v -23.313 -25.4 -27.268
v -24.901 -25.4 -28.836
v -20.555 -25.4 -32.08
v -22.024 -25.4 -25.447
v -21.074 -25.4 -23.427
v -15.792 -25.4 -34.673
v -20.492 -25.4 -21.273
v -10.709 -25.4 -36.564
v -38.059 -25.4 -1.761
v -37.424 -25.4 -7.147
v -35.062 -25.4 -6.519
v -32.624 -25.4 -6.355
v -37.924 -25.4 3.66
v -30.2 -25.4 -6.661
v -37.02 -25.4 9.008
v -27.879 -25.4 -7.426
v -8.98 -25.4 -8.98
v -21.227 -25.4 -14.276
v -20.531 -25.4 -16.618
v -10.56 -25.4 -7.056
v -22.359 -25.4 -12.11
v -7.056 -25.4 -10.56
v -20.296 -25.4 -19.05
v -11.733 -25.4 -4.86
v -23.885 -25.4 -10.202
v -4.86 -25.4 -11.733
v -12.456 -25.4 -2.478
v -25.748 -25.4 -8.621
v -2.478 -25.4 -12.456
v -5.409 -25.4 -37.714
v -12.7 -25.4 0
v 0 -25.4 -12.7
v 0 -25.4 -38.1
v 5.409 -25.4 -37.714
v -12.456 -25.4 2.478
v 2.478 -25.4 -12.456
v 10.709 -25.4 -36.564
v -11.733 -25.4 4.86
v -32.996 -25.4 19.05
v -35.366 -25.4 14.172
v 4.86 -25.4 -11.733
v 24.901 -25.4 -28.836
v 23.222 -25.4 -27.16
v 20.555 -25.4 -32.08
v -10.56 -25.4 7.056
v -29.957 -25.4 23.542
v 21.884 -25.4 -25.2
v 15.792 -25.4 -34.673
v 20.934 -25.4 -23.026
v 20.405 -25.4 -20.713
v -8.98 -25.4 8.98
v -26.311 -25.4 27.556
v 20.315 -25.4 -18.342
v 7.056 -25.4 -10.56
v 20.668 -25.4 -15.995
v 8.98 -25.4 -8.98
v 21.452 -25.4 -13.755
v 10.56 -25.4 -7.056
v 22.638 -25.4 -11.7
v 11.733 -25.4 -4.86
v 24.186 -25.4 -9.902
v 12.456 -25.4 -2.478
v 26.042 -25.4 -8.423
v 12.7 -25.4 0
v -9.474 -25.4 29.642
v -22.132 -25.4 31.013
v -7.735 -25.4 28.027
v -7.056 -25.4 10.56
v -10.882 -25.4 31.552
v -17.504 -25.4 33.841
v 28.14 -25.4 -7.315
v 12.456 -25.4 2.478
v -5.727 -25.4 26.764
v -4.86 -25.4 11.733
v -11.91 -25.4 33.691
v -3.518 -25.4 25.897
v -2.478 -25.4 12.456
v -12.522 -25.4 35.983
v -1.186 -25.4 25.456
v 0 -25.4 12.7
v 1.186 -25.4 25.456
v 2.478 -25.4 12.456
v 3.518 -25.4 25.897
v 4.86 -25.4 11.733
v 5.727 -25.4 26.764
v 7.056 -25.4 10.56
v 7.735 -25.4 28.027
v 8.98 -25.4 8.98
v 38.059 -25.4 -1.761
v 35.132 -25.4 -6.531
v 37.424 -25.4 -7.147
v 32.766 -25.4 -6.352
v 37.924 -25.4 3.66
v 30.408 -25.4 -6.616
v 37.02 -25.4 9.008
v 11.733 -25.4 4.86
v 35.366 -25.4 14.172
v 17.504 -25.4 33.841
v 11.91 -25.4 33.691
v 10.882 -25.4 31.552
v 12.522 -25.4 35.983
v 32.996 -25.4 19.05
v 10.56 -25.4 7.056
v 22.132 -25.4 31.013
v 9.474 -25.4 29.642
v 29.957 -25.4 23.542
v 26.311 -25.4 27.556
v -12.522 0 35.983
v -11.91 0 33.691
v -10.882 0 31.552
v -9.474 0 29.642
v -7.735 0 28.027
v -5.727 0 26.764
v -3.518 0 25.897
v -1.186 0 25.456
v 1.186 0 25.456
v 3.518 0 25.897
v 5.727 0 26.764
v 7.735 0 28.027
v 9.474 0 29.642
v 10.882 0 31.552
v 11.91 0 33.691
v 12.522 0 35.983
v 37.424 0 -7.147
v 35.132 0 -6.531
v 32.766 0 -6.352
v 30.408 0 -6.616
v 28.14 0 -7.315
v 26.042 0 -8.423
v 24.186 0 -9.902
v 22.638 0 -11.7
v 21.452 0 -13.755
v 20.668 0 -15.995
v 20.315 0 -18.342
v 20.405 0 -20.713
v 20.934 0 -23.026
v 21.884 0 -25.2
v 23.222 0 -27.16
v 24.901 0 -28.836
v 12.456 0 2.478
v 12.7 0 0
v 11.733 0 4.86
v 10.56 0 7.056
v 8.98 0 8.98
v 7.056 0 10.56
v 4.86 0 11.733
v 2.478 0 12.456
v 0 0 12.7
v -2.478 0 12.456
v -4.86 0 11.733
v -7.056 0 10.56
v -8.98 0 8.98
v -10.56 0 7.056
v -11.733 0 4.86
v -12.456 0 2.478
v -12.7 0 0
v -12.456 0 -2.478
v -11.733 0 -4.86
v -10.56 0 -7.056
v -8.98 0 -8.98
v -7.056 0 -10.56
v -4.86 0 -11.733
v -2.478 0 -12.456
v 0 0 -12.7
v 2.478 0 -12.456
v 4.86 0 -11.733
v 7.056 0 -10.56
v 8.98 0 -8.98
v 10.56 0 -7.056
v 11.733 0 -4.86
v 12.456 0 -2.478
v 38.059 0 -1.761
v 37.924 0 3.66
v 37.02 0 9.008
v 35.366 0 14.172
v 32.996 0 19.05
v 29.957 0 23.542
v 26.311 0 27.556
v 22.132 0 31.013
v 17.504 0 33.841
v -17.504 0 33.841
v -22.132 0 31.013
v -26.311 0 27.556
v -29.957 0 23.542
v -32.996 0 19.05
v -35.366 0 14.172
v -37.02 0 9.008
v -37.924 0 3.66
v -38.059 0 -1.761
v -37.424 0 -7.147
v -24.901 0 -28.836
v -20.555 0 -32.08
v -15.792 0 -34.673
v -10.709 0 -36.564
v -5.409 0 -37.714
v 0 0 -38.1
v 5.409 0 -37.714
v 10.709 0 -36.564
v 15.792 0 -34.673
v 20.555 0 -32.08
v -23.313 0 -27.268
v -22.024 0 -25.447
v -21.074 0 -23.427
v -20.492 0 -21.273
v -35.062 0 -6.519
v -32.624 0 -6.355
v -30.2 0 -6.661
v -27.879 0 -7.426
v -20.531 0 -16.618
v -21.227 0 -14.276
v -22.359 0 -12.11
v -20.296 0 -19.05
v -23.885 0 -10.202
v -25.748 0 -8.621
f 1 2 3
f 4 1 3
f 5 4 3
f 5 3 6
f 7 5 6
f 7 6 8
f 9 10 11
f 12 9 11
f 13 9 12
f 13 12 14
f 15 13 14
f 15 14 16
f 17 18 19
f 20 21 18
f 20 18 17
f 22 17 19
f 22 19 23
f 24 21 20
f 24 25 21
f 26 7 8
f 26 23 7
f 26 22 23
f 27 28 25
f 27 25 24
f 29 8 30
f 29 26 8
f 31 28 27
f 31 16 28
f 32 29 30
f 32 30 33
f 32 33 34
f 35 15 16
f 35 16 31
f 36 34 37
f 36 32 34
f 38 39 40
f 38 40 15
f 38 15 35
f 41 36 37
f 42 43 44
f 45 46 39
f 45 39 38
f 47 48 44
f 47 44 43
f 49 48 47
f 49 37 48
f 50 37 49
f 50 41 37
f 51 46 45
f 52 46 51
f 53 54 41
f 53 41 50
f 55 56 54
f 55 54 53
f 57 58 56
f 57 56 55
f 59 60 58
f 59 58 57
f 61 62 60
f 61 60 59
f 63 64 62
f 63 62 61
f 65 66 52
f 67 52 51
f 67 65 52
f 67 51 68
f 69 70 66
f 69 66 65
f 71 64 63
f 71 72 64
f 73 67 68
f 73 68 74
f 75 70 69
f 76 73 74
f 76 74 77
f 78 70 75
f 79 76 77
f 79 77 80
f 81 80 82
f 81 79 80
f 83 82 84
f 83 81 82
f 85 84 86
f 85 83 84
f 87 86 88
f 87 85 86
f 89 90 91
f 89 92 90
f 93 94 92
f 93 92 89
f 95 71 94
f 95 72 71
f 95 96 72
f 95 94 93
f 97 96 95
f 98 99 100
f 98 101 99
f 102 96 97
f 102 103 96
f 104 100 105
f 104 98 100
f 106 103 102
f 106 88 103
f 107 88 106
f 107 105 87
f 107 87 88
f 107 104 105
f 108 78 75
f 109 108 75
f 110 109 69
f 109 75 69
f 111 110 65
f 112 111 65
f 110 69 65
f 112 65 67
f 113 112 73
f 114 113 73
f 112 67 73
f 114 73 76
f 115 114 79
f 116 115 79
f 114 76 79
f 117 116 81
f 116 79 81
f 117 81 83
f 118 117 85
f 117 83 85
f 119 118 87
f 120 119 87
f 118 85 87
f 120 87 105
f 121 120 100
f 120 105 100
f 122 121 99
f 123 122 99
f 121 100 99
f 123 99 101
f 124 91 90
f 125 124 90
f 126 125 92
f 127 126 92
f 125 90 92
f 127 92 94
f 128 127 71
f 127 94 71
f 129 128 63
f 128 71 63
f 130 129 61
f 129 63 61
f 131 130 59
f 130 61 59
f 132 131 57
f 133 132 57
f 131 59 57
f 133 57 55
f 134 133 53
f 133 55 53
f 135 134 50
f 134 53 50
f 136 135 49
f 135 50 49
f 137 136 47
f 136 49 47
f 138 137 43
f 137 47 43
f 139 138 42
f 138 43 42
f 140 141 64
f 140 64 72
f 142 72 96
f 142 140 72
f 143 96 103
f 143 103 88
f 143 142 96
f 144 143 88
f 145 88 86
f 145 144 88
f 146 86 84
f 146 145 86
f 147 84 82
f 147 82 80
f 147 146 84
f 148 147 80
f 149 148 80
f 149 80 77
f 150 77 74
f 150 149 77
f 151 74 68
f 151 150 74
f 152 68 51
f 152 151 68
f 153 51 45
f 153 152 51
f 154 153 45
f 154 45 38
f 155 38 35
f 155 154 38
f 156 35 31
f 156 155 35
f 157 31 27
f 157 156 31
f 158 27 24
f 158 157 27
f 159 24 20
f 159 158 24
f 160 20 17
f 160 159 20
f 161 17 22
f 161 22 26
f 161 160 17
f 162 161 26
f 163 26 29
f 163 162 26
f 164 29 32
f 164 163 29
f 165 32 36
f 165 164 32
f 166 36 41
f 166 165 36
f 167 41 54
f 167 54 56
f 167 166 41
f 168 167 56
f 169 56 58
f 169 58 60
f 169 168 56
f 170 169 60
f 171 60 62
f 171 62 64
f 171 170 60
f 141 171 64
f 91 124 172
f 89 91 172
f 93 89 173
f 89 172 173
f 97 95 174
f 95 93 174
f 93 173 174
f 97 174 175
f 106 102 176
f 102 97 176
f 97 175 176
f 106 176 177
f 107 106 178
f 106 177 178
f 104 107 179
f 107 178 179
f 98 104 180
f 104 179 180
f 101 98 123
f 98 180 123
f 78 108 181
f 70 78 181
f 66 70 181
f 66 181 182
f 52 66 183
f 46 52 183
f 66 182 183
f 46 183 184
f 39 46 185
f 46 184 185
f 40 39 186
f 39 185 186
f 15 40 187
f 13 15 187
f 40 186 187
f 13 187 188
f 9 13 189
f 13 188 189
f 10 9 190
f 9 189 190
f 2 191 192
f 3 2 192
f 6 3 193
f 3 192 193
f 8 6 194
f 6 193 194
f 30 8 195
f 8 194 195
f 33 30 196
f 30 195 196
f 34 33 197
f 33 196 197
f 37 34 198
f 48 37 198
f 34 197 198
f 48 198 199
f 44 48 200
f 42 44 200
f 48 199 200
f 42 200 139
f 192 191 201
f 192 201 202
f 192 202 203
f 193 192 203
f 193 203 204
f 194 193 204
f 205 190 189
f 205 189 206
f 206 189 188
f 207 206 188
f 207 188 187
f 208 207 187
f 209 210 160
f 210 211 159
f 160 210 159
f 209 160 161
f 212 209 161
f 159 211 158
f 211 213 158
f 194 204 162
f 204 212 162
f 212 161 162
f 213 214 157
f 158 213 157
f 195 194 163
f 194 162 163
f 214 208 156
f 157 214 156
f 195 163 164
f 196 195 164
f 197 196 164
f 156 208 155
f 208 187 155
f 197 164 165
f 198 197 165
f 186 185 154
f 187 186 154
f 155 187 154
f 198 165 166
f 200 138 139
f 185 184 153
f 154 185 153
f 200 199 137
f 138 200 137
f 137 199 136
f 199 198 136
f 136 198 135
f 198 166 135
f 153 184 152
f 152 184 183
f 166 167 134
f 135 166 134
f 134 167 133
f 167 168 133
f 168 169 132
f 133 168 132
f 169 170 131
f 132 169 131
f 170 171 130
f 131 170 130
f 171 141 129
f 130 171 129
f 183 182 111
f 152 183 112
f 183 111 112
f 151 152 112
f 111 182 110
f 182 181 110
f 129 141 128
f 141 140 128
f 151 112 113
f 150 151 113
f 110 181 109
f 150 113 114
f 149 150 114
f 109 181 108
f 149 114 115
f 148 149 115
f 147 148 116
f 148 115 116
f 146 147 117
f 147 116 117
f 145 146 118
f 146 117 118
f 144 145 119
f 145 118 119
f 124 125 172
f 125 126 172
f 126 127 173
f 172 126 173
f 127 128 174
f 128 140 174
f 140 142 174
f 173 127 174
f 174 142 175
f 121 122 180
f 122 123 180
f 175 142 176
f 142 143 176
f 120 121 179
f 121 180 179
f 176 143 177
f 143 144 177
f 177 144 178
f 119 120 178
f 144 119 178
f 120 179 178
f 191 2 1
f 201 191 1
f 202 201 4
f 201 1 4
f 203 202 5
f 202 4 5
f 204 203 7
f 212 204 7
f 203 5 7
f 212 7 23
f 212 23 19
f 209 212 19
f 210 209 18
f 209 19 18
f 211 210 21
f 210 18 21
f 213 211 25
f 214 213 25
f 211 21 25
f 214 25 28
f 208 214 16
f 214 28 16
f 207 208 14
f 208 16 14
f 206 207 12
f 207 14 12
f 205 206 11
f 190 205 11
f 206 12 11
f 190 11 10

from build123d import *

# Parameters (mm, degrees)
F0_R     = 38.1
F0_R_2   = 12.7
F1_DEPTH = 25.4
F3_DEPTH = 25.4


with BuildPart() as f1:
    # F0 (on Front) → F1 (new body)
    with BuildSketch(Plane.XZ):
        Circle(F0_R)
        Circle(F0_R_2, mode=Mode.SUBTRACT)
    extrude(amount=F1_DEPTH)

    # F2 (on face) → F3 (cut)
    with BuildSketch(Plane.XZ.offset(25.4)):
        with BuildLine():
            ThreePointArc((12.522369, 35.983333), (12.655514, 37.037946), (12.7, 38.1))
            ThreePointArc((12.7, 38.1), (-1.062054, 50.755514), (-12.522369, 35.983333))
            ThreePointArc((-12.522369, 35.983333), (0, 38.1), (12.522369, 35.983333))
        make_face()
        with BuildLine():
            ThreePointArc((-20.295568, -19.05), (-25.748045, -8.62103), (-37.423665, -7.146977))
            ThreePointArc((-37.423665, -7.146977), (-32.995568, -19.05), (-24.901296, -28.836356))
            ThreePointArc((-24.901296, -28.836356), (-21.504544, -24.457992), (-20.295568, -19.05))
        make_face()
        with BuildLine():
            ThreePointArc((24.901296, -28.836356), (32.995568, -19.05), (37.423665, -7.146977))
            ThreePointArc((37.423665, -7.146977), (21.997045, -12.7), (24.901296, -28.836356))
        make_face()
        with BuildLine():
            ThreePointArc((12.522369, 35.983333), (0, 38.1), (-12.522369, 35.983333))
            ThreePointArc((-12.522369, 35.983333), (0, 25.4), (12.522369, 35.983333))
        make_face()
        with BuildLine():
            ThreePointArc((45.695568, -19.05), (43.424538, -11.802478), (37.423665, -7.146977))
            ThreePointArc((37.423665, -7.146977), (32.995568, -19.05), (24.901296, -28.836356))
            ThreePointArc((24.901296, -28.836356), (38.40356, -30.541024), (45.695568, -19.05))
        make_face()
        with BuildLine():
            ThreePointArc((-24.901296, -28.836356), (-32.995568, -19.05), (-37.423665, -7.146977))
            ThreePointArc((-37.423665, -7.146977), (-43.994091, -25.4), (-24.901296, -28.836356))
        make_face()
    extrude(amount=-F3_DEPTH, mode=Mode.SUBTRACT)


solid = f1.part
